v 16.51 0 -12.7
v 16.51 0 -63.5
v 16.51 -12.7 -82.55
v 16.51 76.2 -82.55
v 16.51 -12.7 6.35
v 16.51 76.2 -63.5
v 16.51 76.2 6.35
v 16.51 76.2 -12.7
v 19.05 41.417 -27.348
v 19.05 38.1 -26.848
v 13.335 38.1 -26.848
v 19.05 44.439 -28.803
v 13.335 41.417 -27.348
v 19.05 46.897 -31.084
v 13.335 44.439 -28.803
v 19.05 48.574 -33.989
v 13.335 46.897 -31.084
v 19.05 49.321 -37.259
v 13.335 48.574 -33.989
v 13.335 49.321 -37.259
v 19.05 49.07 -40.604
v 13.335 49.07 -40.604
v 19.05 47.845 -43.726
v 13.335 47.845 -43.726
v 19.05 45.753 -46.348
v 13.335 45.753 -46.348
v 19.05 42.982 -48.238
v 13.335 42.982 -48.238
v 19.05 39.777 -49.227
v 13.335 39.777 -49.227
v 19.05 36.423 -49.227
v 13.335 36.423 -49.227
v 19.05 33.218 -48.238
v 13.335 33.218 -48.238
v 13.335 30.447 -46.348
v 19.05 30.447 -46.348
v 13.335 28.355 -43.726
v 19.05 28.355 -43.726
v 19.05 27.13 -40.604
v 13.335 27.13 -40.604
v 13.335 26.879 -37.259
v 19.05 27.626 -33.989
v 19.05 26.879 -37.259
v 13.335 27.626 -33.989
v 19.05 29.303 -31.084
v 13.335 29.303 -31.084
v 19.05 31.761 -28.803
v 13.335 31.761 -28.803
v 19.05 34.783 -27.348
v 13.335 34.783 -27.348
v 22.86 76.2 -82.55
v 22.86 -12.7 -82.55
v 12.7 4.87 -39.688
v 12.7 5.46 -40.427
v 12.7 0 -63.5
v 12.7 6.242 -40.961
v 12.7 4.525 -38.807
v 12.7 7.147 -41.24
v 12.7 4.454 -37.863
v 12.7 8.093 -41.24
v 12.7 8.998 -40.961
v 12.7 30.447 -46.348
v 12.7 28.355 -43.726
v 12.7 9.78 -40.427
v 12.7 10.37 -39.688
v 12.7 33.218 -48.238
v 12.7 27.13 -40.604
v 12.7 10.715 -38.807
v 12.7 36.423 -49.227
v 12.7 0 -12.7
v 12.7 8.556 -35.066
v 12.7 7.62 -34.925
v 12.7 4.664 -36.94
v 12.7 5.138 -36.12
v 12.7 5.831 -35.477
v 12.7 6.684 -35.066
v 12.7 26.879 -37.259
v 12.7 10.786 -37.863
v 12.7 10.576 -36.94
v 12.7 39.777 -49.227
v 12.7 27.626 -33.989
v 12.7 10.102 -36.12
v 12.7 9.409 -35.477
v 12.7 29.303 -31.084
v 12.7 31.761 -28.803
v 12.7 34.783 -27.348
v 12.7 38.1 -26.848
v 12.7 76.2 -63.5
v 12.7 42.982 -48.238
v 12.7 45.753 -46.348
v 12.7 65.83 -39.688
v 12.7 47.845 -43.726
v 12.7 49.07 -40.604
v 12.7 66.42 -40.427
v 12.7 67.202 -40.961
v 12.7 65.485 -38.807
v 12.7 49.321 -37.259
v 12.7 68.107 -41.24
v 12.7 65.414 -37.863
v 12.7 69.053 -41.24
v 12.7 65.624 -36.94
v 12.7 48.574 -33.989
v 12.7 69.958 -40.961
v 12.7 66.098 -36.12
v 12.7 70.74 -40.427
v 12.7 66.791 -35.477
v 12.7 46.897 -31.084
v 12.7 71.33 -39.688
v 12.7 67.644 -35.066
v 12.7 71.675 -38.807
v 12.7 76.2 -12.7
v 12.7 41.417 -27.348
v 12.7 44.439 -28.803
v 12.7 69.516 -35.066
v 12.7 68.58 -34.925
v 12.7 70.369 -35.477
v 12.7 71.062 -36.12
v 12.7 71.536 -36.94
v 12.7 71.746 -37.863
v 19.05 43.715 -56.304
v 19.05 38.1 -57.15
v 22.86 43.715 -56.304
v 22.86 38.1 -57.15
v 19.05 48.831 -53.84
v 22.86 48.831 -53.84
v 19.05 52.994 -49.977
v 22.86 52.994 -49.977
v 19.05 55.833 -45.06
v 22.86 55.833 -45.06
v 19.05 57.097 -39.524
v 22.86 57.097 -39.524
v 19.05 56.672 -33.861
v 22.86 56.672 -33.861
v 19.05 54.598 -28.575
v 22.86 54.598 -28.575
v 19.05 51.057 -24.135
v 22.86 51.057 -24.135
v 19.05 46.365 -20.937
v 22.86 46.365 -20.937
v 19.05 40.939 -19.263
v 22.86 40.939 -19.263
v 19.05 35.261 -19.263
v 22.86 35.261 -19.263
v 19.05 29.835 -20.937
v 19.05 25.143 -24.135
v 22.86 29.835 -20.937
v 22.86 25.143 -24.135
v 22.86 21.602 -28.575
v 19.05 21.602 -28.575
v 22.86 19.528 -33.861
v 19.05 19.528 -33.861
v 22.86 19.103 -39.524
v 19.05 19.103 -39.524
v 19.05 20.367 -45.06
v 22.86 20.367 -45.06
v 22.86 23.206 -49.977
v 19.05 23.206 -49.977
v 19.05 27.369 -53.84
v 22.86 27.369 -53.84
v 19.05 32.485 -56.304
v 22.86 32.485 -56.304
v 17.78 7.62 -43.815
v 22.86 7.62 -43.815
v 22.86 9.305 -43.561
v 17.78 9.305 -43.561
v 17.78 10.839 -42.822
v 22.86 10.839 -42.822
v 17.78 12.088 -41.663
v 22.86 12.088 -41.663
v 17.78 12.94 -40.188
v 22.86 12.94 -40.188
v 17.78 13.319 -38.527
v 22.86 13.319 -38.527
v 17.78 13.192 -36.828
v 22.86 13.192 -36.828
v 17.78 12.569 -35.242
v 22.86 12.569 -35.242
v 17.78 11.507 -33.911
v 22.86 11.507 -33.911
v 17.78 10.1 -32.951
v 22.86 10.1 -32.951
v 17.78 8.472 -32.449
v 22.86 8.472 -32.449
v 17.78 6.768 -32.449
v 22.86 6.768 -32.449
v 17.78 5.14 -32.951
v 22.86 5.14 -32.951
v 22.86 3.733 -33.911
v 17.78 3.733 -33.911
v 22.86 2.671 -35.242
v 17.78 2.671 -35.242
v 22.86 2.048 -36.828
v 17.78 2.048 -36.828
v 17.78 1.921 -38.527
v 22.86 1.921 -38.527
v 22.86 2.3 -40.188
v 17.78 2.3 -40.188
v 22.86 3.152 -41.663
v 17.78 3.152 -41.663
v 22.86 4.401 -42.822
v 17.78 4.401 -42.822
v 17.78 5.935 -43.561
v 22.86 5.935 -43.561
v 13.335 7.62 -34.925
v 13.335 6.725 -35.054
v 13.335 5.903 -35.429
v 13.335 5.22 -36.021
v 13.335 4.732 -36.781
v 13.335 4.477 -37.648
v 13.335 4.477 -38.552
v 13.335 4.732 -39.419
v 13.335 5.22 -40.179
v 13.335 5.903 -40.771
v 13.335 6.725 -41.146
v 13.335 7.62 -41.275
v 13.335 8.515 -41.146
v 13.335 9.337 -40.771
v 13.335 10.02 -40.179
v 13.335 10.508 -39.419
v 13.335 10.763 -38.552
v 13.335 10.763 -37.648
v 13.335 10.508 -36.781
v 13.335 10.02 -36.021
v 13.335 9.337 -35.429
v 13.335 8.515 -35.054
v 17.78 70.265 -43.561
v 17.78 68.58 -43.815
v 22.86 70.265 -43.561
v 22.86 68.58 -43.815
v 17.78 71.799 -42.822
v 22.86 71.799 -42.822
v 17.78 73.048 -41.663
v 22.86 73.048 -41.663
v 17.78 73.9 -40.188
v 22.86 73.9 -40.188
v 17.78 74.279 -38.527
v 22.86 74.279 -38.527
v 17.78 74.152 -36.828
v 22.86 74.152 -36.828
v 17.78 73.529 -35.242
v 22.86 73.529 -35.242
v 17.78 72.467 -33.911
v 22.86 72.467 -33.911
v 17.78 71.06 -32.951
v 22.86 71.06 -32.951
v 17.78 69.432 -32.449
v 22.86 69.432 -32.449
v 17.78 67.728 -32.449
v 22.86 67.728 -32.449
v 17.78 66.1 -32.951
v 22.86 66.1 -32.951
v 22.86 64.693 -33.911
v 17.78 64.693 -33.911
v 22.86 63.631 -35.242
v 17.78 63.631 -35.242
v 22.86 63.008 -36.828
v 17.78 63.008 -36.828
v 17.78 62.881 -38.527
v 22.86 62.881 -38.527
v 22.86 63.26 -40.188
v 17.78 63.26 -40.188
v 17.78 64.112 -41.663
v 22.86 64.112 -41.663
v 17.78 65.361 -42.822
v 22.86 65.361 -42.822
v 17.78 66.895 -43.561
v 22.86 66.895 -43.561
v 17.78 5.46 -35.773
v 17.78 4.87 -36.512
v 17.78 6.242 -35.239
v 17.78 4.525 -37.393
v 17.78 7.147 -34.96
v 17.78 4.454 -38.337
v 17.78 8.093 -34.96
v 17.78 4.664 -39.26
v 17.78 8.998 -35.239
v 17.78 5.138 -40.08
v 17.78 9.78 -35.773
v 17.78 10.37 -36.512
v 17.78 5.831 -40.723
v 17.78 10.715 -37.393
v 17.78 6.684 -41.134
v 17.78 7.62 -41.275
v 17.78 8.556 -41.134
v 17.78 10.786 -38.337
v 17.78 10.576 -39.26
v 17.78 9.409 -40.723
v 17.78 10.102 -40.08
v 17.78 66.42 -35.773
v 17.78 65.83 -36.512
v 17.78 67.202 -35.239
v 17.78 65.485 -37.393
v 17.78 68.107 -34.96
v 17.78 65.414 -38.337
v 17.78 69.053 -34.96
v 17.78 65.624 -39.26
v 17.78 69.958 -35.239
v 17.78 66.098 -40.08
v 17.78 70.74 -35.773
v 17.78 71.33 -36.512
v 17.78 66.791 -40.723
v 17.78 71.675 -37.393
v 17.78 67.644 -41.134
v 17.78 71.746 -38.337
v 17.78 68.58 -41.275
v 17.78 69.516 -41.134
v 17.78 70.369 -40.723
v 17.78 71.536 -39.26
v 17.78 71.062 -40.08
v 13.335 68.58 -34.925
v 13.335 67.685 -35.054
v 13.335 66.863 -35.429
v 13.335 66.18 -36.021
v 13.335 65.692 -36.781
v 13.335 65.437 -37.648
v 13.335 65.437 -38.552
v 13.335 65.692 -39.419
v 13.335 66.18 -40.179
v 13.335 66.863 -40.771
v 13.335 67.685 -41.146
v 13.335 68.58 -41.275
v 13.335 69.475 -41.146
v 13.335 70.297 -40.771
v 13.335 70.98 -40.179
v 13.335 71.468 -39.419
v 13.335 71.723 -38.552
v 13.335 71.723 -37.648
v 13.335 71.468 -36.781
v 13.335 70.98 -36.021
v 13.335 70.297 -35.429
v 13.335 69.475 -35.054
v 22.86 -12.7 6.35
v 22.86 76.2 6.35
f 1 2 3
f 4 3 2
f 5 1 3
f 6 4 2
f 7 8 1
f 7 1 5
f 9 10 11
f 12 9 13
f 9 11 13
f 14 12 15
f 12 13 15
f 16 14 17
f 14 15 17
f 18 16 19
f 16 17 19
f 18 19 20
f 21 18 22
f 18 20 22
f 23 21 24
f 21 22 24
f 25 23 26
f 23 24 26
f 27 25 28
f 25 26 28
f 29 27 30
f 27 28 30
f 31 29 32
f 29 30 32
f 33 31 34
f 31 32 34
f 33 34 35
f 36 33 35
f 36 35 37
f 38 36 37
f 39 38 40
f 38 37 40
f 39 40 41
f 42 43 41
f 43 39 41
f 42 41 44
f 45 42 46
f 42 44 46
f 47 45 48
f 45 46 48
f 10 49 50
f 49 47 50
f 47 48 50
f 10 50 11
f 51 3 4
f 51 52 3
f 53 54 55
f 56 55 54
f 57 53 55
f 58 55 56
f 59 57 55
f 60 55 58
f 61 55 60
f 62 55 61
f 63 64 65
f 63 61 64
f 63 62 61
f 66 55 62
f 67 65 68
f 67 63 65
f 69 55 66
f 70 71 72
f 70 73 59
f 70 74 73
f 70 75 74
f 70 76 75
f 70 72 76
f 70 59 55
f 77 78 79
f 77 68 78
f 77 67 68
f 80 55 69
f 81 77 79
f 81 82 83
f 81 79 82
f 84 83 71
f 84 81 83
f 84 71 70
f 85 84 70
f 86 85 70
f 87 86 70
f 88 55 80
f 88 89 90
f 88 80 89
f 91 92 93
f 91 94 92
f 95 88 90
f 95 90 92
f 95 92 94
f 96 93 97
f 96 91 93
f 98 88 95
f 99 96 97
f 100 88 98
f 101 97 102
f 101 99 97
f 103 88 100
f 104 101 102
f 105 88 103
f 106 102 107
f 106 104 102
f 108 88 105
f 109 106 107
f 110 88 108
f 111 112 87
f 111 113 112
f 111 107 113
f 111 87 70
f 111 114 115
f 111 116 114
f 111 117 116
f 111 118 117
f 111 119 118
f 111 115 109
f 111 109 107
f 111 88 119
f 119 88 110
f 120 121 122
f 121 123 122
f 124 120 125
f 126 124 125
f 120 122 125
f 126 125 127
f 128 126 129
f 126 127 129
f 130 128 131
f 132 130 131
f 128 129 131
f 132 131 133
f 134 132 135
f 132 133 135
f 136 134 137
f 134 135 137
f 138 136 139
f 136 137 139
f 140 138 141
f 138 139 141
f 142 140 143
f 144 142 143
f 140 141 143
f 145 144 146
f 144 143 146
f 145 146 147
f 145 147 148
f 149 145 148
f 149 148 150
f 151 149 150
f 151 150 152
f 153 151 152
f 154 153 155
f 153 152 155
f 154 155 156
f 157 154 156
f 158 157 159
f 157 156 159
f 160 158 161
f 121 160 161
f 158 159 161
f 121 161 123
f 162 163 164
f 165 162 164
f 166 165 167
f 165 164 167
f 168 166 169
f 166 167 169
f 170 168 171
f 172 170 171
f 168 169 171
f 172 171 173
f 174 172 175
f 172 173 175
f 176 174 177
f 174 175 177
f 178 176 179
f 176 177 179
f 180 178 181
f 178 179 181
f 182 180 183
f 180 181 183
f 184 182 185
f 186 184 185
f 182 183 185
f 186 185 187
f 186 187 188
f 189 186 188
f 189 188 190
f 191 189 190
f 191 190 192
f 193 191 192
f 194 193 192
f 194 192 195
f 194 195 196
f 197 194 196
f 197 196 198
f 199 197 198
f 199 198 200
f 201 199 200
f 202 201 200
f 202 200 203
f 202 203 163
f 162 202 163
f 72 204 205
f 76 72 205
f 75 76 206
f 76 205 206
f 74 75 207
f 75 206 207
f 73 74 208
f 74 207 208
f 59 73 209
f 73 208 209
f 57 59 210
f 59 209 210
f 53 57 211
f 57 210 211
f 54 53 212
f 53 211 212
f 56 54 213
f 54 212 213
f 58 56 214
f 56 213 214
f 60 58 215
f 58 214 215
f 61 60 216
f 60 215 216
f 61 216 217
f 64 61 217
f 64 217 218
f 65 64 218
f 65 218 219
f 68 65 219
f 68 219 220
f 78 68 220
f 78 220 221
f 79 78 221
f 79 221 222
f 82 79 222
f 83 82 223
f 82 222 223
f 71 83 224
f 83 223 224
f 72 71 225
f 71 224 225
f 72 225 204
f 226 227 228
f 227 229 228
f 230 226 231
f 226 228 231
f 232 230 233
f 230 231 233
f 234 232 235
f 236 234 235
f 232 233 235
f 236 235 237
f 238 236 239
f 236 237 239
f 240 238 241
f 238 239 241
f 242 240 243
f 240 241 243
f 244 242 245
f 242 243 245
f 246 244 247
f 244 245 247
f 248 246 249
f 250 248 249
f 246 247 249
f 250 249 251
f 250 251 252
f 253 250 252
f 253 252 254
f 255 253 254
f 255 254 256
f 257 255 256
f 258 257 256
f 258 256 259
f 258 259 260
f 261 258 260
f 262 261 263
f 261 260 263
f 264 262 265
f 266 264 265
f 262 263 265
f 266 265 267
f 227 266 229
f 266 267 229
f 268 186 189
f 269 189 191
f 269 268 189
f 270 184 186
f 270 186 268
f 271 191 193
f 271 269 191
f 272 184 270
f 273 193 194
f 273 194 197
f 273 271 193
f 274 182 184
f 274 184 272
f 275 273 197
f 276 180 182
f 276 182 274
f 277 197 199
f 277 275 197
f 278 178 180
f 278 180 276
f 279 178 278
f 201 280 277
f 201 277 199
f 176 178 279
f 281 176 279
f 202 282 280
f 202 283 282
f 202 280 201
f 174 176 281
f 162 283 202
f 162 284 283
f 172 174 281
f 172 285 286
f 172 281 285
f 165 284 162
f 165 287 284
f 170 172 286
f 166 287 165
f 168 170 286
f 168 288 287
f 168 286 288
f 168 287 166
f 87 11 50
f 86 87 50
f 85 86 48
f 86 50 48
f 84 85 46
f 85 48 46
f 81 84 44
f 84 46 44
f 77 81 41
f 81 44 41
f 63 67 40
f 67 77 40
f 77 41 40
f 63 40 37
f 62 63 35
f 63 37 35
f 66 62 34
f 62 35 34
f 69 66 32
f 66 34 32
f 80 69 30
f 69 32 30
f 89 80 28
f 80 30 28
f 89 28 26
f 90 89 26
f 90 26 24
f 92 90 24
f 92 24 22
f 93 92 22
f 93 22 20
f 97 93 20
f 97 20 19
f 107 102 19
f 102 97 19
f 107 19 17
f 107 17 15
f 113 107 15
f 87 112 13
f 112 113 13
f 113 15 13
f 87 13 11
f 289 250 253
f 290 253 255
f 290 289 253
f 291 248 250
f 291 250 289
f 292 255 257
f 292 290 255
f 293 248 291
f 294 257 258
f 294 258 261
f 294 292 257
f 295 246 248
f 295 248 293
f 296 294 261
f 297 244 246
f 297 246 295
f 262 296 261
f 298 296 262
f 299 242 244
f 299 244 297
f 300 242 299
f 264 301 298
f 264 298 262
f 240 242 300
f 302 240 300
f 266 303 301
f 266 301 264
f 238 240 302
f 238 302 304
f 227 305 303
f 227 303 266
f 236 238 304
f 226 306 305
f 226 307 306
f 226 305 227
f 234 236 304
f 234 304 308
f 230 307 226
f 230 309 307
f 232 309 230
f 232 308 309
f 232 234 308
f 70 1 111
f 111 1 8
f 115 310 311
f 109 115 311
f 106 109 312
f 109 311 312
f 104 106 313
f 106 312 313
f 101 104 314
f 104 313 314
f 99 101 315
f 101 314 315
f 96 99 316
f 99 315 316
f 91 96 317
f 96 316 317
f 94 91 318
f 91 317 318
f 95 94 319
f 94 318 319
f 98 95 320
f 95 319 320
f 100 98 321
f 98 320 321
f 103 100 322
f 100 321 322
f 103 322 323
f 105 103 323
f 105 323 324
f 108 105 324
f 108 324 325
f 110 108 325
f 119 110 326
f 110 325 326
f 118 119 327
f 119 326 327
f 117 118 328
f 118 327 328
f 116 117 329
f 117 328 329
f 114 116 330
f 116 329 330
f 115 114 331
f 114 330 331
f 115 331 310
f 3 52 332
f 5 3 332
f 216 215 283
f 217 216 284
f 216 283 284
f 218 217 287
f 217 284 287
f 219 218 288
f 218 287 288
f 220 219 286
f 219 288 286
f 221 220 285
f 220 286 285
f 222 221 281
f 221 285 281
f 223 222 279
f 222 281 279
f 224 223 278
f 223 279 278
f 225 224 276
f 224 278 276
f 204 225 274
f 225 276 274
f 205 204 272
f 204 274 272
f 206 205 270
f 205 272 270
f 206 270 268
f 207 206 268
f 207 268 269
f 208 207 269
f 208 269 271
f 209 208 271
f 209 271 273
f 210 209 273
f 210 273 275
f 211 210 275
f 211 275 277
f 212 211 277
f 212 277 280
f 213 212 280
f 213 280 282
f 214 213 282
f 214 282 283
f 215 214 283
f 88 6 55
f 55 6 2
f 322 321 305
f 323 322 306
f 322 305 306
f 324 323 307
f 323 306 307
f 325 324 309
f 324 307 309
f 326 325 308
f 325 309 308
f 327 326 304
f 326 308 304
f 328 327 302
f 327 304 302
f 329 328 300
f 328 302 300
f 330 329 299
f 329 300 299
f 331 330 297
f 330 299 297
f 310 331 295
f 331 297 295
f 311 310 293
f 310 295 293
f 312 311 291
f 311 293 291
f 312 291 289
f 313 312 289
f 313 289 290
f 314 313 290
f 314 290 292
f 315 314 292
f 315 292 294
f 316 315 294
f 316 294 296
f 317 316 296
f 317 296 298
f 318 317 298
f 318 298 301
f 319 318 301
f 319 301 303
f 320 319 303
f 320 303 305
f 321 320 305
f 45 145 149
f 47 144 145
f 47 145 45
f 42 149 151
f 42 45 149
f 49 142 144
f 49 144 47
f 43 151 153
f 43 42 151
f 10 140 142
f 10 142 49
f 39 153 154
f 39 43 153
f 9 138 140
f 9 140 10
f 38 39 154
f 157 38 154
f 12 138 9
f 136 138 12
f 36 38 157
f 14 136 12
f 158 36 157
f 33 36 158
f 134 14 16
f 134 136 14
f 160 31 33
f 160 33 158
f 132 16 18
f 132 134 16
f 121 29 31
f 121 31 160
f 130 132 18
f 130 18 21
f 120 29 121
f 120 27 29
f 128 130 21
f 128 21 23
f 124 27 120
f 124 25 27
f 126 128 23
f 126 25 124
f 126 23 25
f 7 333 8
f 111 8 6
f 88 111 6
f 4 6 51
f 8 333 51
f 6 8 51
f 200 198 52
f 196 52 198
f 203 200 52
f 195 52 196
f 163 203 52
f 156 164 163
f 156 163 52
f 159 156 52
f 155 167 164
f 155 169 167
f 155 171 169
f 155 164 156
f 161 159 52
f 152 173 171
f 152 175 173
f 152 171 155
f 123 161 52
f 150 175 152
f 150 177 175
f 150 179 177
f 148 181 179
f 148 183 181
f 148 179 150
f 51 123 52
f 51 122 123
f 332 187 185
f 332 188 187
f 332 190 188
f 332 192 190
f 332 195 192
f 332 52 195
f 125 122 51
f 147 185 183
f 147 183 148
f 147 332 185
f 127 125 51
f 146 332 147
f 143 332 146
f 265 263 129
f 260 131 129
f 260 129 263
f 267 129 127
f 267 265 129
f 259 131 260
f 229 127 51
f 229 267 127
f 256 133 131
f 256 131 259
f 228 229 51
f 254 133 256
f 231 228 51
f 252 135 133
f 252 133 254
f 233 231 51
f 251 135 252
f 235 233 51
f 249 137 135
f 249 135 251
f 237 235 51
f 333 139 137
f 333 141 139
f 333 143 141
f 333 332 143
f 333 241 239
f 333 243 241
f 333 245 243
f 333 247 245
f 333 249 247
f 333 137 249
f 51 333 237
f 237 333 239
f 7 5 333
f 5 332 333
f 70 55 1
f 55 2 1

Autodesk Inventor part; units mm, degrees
ref_plane "YZ Plane" through (0, 0, 0) normal (1, 0, 0) x (0, 1, 0)
ref_plane "XZ Plane" through (0, 0, 0) normal (0, 1, 0) x (-1, 0, 0)
ref_plane "XY Plane" through (0, 0, 0) normal (0, 0, 1) x (1, 0, 0)
sketch "Sketch3" plane through (0, 0, 0) normal (1, 0, 0) x (0, 1, 0)
  line L0 (0, 0) -> (76.2, 0)
  line L1 (76.2, 0) -> (76.2, -76.2)
  line L2 (76.2, -76.2) -> (0, -76.2)
  line L3 (0, -76.2) -> (0, 0)
  line L4 (76.2, 0) -> (50.8, 0)
  line L5 (50.8, 50.8) -> (76.2, 50.8)
  line L6 (76.2, 50.8) -> (76.2, 0)
  line L7 (76.2, -76.2) -> (50.8, -76.2)
  line L8 (50.8, -127) -> (76.2, -127)
  line L9 (76.2, -127) -> (76.2, -76.2)
  line L10 (50.8, 50.8) -> (-50.8, 50.8)
  line L11 (-50.8, 50.8) -> (-50.8, 0)
  line L12 (0, 0) -> (50.8, 0)
  line L13 (50.8, -76.2) -> (0, -76.2)
  line L14 (-50.8, -76.2) -> (-50.8, -127)
  line L15 (-50.8, -127) -> (50.8, -127)
  line L16 (0, 0) -> (0, -76.2)
  line L17 (-50.8, -76.2) -> (-50.8, 0)
  dimension "d1" = 76.2
  dimension "d26" = 50.8
extrude "Extrusion1" add sketch "Sketch3" along normal blind 25.4
sketch "Sketch5" plane through (0, 0, 0) normal (-1, 0, 0) x (0, 0, 1)
  line L0 (-76.2, 76.2) -> (0, 76.2) projected
  line L1 (-76.2, 76.2) -> (-38.1, 76.2)
  line L2 (-38.1, 76.2) -> (-38.1, 63.5)
  line L3 (-38.1, 63.5) -> (-38.1, 38.1)
  circle A0 centre (-38.1, 38.1) radius 11.2522
  point P0 (0, 0)
  dimension "d10" = 38.1
  dimension "d11" = 12.7
  dimension "d12" = 25.4
  dimension "d13" = 22.5044
extrude "Extrusion3" cut sketch "Sketch5" against normal blind 76.2
sketch "Sketch6" plane through (25.4, 0, 0) normal (1, 0, 0) x (0, 0, -1)
  circle A0 centre (38.1, 38.1) radius 11.2522 projected
  circle A1 centre (38.1, 38.1) radius 19.05
  point P0 (0, 0)
  dimension "d20" = 38.1
extrude "Extrusion4" cut sketch "Sketch6" against normal blind 6.35
sketch "Sketch8" plane through (0, 76.2, 50.8) normal (0, 1, 0) x (1, 0, 0)
  line L0 (0, 0) -> (25.4, 0) projected
  line L1 (12.7, 0) -> (9.525, 0)
  line L2 (9.525, 0) -> (15.875, 0)
  line L3 (15.875, 0) -> (15.875, 50.8)
  line L4 (15.875, 50.8) -> (9.525, 50.8)
  line L5 (9.525, 50.8) -> (9.525, 0)
  line L6 (0, 177.8) -> (0, 0) projected
  line L7 (12.7, 177.8) -> (9.525, 177.8)
  line L8 (9.525, 177.8) -> (15.875, 177.8)
  line L9 (15.875, 177.8) -> (15.875, 127)
  line L10 (15.875, 127) -> (9.525, 127)
  line L11 (9.525, 127) -> (9.525, 177.8)
  line L12 (0, 0) -> (0, 177.8)
  point P0 (0, 50.8)
  point P1 (25.4, 177.8)
  point P2 (15.875, 0)
  dimension "d28" = 6.35
  dimension "d29" = 50.8
extrude "Extrusion5" cut sketch "Sketch8" against normal blind 76.2
sketch "Sketch9" plane through (0, -50.8, 50.8) normal (0, 0, 1) x (1, 0, 0)
  line L0 (9.525, 50.8) -> (15.875, 50.8)
  line L1 (15.875, 50.8) -> (15.875, 0)
  line L2 (15.875, 0) -> (9.525, 0)
  line L3 (9.525, 0) -> (9.525, 50.8)
  point P0 (0, 50.8)
  dimension "d32" = 6.35
  dimension "d33" = 50.8
extrude "Extrusion6" cut sketch "Sketch9" against normal blind 203.2
sketch "Sketch10" plane through (0, 0, 0) normal (-1, 0, 0) x (0, 0, 1)
  circle A0 centre (-38.1, 38.1) radius 11.2522 projected
  circle A1 centre (-38.1, 38.1) radius 19.05
  point P0 (0, 0)
  dimension "d36" = 38.1
extrude "Extrusion7" cut sketch "Sketch10" against normal blind 5.08 contours A0 | A1
sketch "Sketch11" plane through (0, 76.2, 50.8) normal (0, 1, 0) x (1, 0, 0)
  line L0 (9.525, 50.8) -> (15.875, 50.8) projected
  line L1 (16.51, 50.8) -> (16.51, 0)
  line L2 (16.51, 0) -> (8.89, 0)
  line L3 (9.525, 177.8) -> (9.525, 0) projected
  line L4 (8.89, 0) -> (8.89, 51.308)
  line L5 (8.89, 0) -> (60.198, 0) construction
  line L6 (8.89, 51.308) -> (16.51, 51.308)
  line L7 (16.51, 51.308) -> (16.51, 50.8)
  line L8 (0, 69.85) -> (0, 107.95) projected
  line L9 (0, 88.9) -> (23.8125, 88.9)
  line L10 (9.525, 127) -> (15.875, 127)
  line L11 (16.51, 127) -> (16.51, 177.8)
  line L12 (16.51, 177.8) -> (8.89, 177.8)
  line L13 (8.89, 177.8) -> (8.89, 126.492)
  line L14 (8.89, 126.492) -> (16.51, 126.492)
  line L15 (16.51, 126.492) -> (16.51, 127)
  point P0 (0, 50.8)
  point P1 (0, 127)
  dimension "d40" = 7.62
extrude "Extrusion8" cut sketch "Sketch11" against normal blind 152.4
sketch "Sketch12" plane through (25.4, -50.8, 50.8) normal (0, 0, 1) x (1, 0, 0)
  line L0 (-8.89, 127) -> (-8.89, 0) projected
  line L1 (-16.51, 127) -> (-16.51, 0) projected
  line L2 (-8.89, 50.8) -> (-16.51, 50.8)
  line L3 (-16.51, 50.8) -> (-16.51, 0)
  line L4 (-16.51, 0) -> (-8.89, 0)
  line L5 (-8.89, 0) -> (-8.89, 50.8)
  point P0 (-25.4, 50.8)
extrude "Extrusion9" cut sketch "Sketch12" against normal blind 203.2
sketch "Sketch13" plane through (25.4, 0, 0) normal (1, 0, 0) x (0, 0, -1)
  line L0 (127, 76.2) -> (-50.8, 76.2) projected
  line L1 (-50.8, -50.8) -> (127, -50.8) projected
  line L2 (-50.8, 76.2) -> (-25.4, 76.2)
  line L3 (-25.4, 76.2) -> (-25.4, -50.8)
  line L4 (-25.4, -50.8) -> (-50.8, -50.8)
  line L5 (-50.8, -50.8) -> (-50.8, 76.2)
  line L6 (127, -50.8) -> (127, 76.2) projected
  line L7 (127, 76.2) -> (75.692, 76.2) projected
  line L8 (127, -50.8) -> (101.6, -50.8)
  line L9 (101.6, -50.8) -> (101.6, 76.2)
  line L10 (101.6, 76.2) -> (127, 76.2)
  line L11 (127, 76.2) -> (127, -50.8)
  point P0 (0, 0)
  dimension "d49" = 25.4
  dimension "d50" = 25.4
extrude "Extrusion10" cut sketch "Sketch13" against normal blind 25.4 contours L6 L1 L9 L0 | L3 L1 L5 L0
sketch "Sketch14" plane through (25.4, 0, 0) normal (1, 0, 0) x (0, 0, -1)
  line L0 (-25.4, -50.8) -> (101.6, -50.8) projected
  line L1 (101.6, -50.8) -> (101.6, 76.2) projected
  line L2 (-25.4, -50.8) -> (101.6, -50.8)
  line L3 (101.6, -50.8) -> (101.6, -12.7)
  line L4 (101.6, -12.7) -> (-25.4, -12.7)
  line L5 (-25.4, -12.7) -> (-25.4, -50.8)
  point P0 (0, 0)
  dimension "d53" = 38.1
extrude "Extrusion11" cut sketch "Sketch14" against normal blind 25.4
sketch "Sketch15" plane through (25.4, 0, 0) normal (1, 0, 0) x (0, 0, -1)
  point P0 (0, 0)
sketch "Sketch16" plane through (0, 76.2, 25.4) normal (0, 0, 1) x (1, 0, 0)
  point P0 (0, -76.2)
sketch "Sketch17" plane through (8.89, 76.2, -75.692) normal (0, 1, 0) x (1, 0, 0)
  line L0 (-8.89, -101.092) -> (0, -101.092) projected
  line L1 (7.62, 25.908) -> (7.62, -101.092) projected
  line L2 (0, -101.092) -> (7.62, -101.092)
  line L3 (7.62, -101.092) -> (7.62, -62.992)
  line L4 (7.62, -62.992) -> (0, -62.992)
  line L5 (0, -62.992) -> (0, -101.092)
  line L6 (7.62, 25.908) -> (7.62, 0) projected
  line L7 (0, -101.092) -> (0, 25.908) projected
  line L8 (7.62, 25.908) -> (0, 25.908)
  line L9 (0, 25.908) -> (0, -12.192)
  line L10 (0, -12.192) -> (7.62, -12.192)
  line L11 (7.62, -12.192) -> (7.62, 25.908)
  point P0 (-8.89, -75.692)
  point P1 (7.62, -12.192)
  dimension "d56" = 38.1
  dimension "d57" = 38.1
extrude "Extrusion12" cut sketch "Sketch17" against normal blind 76.2 contours L1 L10 L7 L8 | L1 L2 L5 L4
sketch "Sketch18" plane through (8.89, 0, -12.7) normal (0, -1, 0) x (1, 0, 0)
  point P0 (-8.89, 12.7)
sketch "Sketch19" plane through (25.4, 0, 0) normal (1, 0, 0) x (0, 0, -1)
  line L0 (12.7, 76.2) -> (-25.4, 76.2) projected
  line L1 (-25.4, -12.7) -> (-6.35, -12.7)
  line L2 (-6.35, -12.7) -> (-6.35, 76.2)
  line L3 (-6.35, 76.2) -> (-25.4, 76.2)
  line L4 (-25.4, 76.2) -> (-25.4, -12.7)
  line L5 (101.6, -12.7) -> (-25.4, -12.7) projected
  line L6 (101.6, 76.2) -> (-25.4, 76.2) projected
  line L7 (101.6, -12.7) -> (82.55, -12.7)
  line L8 (82.55, -12.7) -> (82.55, 76.2)
  line L9 (82.55, 76.2) -> (101.6, 76.2)
  line L10 (101.6, 76.2) -> (101.6, -12.7)
  point P0 (0, 0)
  dimension "d60" = 19.05
extrude "Extrusion13" cut sketch "Sketch19" against normal blind 76.2 contours L2 L1 L4 L0 | L6 L10 L5 L8
sketch "Sketch20" plane through (0, 76.2, 6.35) normal (0, 0, 1) x (1, 0, 0)
  line L0 (8.89, -88.9) -> (0, -88.9) projected
  line L1 (8.89, 0) -> (8.89, -76.2) projected
  line L2 (0, -88.9) -> (8.89, -88.9)
  line L3 (8.89, -88.9) -> (8.89, 0)
  line L4 (8.89, 0) -> (0, 0)
  line L5 (0, 0) -> (0, -88.9)
  point P0 (0, -76.2)
extrude "Extrusion14" cut sketch "Sketch20" against normal blind 127
sketch "Sketch21" plane through (25.4, 0, 0) normal (1, 0, 0) x (0, 0, -1)
  point P0 (0, 0)
sketch "Sketch22" plane through (16.51, 76.2, 6.35) normal (0, 1, 0) x (1, 0, 0)
  line L0 (0, 19.05) -> (-7.62, 19.05) projected
  line L1 (-7.62, 69.85) -> (0, 69.85) projected
  line L2 (0, 19.05) -> (-3.175, 19.05)
  line L3 (-3.175, 19.05) -> (-3.175, 69.85)
  line L4 (-3.175, 69.85) -> (0, 69.85)
  line L5 (0, 69.85) -> (0, 19.05)
  line L6 (-7.62, 69.85) -> (-7.62, 19.05) projected
  line L7 (-3.175, 69.85) -> (-7.62, 69.85)
  line L8 (-7.62, 69.85) -> (-7.62, 19.05)
  line L9 (-7.62, 19.05) -> (-3.175, 19.05)
  line L10 (-3.175, 19.05) -> (-3.175, 69.85)
  point P0 (-16.51, 6.35)
  point P1 (-3.175, 19.05)
  dimension "d65" = 3.175
extrude "Extrusion15" cut sketch "Sketch22" against normal blind 127 contours L0 L6 L1 L3
sketch "Sketch23" plane through (25.4, -12.7, 6.35) normal (0, 0, 1) x (1, 0, 0)
  line L0 (0, 88.9) -> (-8.89, 88.9) projected
  line L1 (-8.89, 0) -> (-2.54, 0)
  line L2 (-2.54, 0) -> (-2.54, 88.9)
  line L3 (-2.54, 88.9) -> (-8.89, 88.9)
  line L4 (-8.89, 88.9) -> (-8.89, 0)
  line L5 (-2.54, 88.9) -> (0, 88.9)
  line L6 (0, 88.9) -> (0, 0)
  line L7 (0, 0) -> (-2.54, 0)
  line L8 (-2.54, 0) -> (-2.54, 88.9)
  point P0 (-25.4, 12.7)
  dimension "d68" = 6.35
extrude "Extrusion16" cut sketch "Sketch23" against normal blind 127 contours L6 L7 L2 L0
sketch "Sketch24" plane through (22.86, -12.7, 6.35) normal (1, 0, 0) x (0, 0, -1)
  circle A0 centre (44.45, 50.8) radius 19.05 projected
  circle A1 centre (44.45, 81.28) radius 3.175
  circle A2 centre (44.45, 20.32) radius 3.175
  point P0 (6.35, 12.7)
  dimension "d72" = 6.35
  dimension "d74" = 6.35
extrude "Extrusion17" cut sketch "Sketch24" against normal blind 127 contours A1 | A2
sketch "Sketch25" plane through (22.86, -12.7, 6.35) normal (1, 0, 0) x (0, 0, -1)
  circle A0 centre (44.45, 81.28) radius 3.175 projected
  circle A1 centre (44.45, 81.28) radius 5.715
  circle A2 centre (44.45, 20.32) radius 3.175 projected
  circle A3 centre (44.45, 20.32) radius 5.715
  point P0 (6.35, 12.7)
  dimension "d77" = 11.43
  dimension "d78" = 11.43
extrude "Extrusion18" cut sketch "Sketch25" against normal blind 5.08 contours A0 | A1 | A2 | A3
sketch "Sketch26" plane through (13.335, 76.2, -63.5) normal (-1, 0, 0) x (0, 0, 1)
  point P0 (63.5, -76.2)
sketch "Sketch27" plane through (22.86, -12.7, 6.35) normal (1, 0, 0) x (0, 0, -1)
  point P0 (6.35, 12.7)
sketch "Sketch28" plane through (13.335, 76.2, -63.5) normal (-1, 0, 0) x (0, 0, 1)
  point P0 (63.5, -76.2)
sketch "Sketch30" plane through (13.335, 76.2, -63.5) normal (-1, 0, 0) x (0, 0, 1)
  circle A0 centre (25.4, -7.62) radius 3.175 projected
  circle A1 centre (25.4, -7.62) radius 3.175
  circle A2 centre (25.4, -38.1) radius 11.2522 projected
  circle A3 centre (25.4, -38.1) radius 11.2522
  circle A4 centre (25.4, -68.58) radius 3.175 projected
  circle A5 centre (25.4, -68.58) radius 3.175
  line L0 (0, -76.2) -> (50.8, -76.2)
  line L1 (50.8, -76.2) -> (50.8, 0)
  line L2 (50.8, 0) -> (0, 0)
  line L3 (0, 0) -> (0, -76.2)
  point P0 (63.5, -76.2)
extrude "Extrusion19" add sketch "Sketch30" along normal blind 0.635
properties part number "220307 Rod Support Part B Corrected"
